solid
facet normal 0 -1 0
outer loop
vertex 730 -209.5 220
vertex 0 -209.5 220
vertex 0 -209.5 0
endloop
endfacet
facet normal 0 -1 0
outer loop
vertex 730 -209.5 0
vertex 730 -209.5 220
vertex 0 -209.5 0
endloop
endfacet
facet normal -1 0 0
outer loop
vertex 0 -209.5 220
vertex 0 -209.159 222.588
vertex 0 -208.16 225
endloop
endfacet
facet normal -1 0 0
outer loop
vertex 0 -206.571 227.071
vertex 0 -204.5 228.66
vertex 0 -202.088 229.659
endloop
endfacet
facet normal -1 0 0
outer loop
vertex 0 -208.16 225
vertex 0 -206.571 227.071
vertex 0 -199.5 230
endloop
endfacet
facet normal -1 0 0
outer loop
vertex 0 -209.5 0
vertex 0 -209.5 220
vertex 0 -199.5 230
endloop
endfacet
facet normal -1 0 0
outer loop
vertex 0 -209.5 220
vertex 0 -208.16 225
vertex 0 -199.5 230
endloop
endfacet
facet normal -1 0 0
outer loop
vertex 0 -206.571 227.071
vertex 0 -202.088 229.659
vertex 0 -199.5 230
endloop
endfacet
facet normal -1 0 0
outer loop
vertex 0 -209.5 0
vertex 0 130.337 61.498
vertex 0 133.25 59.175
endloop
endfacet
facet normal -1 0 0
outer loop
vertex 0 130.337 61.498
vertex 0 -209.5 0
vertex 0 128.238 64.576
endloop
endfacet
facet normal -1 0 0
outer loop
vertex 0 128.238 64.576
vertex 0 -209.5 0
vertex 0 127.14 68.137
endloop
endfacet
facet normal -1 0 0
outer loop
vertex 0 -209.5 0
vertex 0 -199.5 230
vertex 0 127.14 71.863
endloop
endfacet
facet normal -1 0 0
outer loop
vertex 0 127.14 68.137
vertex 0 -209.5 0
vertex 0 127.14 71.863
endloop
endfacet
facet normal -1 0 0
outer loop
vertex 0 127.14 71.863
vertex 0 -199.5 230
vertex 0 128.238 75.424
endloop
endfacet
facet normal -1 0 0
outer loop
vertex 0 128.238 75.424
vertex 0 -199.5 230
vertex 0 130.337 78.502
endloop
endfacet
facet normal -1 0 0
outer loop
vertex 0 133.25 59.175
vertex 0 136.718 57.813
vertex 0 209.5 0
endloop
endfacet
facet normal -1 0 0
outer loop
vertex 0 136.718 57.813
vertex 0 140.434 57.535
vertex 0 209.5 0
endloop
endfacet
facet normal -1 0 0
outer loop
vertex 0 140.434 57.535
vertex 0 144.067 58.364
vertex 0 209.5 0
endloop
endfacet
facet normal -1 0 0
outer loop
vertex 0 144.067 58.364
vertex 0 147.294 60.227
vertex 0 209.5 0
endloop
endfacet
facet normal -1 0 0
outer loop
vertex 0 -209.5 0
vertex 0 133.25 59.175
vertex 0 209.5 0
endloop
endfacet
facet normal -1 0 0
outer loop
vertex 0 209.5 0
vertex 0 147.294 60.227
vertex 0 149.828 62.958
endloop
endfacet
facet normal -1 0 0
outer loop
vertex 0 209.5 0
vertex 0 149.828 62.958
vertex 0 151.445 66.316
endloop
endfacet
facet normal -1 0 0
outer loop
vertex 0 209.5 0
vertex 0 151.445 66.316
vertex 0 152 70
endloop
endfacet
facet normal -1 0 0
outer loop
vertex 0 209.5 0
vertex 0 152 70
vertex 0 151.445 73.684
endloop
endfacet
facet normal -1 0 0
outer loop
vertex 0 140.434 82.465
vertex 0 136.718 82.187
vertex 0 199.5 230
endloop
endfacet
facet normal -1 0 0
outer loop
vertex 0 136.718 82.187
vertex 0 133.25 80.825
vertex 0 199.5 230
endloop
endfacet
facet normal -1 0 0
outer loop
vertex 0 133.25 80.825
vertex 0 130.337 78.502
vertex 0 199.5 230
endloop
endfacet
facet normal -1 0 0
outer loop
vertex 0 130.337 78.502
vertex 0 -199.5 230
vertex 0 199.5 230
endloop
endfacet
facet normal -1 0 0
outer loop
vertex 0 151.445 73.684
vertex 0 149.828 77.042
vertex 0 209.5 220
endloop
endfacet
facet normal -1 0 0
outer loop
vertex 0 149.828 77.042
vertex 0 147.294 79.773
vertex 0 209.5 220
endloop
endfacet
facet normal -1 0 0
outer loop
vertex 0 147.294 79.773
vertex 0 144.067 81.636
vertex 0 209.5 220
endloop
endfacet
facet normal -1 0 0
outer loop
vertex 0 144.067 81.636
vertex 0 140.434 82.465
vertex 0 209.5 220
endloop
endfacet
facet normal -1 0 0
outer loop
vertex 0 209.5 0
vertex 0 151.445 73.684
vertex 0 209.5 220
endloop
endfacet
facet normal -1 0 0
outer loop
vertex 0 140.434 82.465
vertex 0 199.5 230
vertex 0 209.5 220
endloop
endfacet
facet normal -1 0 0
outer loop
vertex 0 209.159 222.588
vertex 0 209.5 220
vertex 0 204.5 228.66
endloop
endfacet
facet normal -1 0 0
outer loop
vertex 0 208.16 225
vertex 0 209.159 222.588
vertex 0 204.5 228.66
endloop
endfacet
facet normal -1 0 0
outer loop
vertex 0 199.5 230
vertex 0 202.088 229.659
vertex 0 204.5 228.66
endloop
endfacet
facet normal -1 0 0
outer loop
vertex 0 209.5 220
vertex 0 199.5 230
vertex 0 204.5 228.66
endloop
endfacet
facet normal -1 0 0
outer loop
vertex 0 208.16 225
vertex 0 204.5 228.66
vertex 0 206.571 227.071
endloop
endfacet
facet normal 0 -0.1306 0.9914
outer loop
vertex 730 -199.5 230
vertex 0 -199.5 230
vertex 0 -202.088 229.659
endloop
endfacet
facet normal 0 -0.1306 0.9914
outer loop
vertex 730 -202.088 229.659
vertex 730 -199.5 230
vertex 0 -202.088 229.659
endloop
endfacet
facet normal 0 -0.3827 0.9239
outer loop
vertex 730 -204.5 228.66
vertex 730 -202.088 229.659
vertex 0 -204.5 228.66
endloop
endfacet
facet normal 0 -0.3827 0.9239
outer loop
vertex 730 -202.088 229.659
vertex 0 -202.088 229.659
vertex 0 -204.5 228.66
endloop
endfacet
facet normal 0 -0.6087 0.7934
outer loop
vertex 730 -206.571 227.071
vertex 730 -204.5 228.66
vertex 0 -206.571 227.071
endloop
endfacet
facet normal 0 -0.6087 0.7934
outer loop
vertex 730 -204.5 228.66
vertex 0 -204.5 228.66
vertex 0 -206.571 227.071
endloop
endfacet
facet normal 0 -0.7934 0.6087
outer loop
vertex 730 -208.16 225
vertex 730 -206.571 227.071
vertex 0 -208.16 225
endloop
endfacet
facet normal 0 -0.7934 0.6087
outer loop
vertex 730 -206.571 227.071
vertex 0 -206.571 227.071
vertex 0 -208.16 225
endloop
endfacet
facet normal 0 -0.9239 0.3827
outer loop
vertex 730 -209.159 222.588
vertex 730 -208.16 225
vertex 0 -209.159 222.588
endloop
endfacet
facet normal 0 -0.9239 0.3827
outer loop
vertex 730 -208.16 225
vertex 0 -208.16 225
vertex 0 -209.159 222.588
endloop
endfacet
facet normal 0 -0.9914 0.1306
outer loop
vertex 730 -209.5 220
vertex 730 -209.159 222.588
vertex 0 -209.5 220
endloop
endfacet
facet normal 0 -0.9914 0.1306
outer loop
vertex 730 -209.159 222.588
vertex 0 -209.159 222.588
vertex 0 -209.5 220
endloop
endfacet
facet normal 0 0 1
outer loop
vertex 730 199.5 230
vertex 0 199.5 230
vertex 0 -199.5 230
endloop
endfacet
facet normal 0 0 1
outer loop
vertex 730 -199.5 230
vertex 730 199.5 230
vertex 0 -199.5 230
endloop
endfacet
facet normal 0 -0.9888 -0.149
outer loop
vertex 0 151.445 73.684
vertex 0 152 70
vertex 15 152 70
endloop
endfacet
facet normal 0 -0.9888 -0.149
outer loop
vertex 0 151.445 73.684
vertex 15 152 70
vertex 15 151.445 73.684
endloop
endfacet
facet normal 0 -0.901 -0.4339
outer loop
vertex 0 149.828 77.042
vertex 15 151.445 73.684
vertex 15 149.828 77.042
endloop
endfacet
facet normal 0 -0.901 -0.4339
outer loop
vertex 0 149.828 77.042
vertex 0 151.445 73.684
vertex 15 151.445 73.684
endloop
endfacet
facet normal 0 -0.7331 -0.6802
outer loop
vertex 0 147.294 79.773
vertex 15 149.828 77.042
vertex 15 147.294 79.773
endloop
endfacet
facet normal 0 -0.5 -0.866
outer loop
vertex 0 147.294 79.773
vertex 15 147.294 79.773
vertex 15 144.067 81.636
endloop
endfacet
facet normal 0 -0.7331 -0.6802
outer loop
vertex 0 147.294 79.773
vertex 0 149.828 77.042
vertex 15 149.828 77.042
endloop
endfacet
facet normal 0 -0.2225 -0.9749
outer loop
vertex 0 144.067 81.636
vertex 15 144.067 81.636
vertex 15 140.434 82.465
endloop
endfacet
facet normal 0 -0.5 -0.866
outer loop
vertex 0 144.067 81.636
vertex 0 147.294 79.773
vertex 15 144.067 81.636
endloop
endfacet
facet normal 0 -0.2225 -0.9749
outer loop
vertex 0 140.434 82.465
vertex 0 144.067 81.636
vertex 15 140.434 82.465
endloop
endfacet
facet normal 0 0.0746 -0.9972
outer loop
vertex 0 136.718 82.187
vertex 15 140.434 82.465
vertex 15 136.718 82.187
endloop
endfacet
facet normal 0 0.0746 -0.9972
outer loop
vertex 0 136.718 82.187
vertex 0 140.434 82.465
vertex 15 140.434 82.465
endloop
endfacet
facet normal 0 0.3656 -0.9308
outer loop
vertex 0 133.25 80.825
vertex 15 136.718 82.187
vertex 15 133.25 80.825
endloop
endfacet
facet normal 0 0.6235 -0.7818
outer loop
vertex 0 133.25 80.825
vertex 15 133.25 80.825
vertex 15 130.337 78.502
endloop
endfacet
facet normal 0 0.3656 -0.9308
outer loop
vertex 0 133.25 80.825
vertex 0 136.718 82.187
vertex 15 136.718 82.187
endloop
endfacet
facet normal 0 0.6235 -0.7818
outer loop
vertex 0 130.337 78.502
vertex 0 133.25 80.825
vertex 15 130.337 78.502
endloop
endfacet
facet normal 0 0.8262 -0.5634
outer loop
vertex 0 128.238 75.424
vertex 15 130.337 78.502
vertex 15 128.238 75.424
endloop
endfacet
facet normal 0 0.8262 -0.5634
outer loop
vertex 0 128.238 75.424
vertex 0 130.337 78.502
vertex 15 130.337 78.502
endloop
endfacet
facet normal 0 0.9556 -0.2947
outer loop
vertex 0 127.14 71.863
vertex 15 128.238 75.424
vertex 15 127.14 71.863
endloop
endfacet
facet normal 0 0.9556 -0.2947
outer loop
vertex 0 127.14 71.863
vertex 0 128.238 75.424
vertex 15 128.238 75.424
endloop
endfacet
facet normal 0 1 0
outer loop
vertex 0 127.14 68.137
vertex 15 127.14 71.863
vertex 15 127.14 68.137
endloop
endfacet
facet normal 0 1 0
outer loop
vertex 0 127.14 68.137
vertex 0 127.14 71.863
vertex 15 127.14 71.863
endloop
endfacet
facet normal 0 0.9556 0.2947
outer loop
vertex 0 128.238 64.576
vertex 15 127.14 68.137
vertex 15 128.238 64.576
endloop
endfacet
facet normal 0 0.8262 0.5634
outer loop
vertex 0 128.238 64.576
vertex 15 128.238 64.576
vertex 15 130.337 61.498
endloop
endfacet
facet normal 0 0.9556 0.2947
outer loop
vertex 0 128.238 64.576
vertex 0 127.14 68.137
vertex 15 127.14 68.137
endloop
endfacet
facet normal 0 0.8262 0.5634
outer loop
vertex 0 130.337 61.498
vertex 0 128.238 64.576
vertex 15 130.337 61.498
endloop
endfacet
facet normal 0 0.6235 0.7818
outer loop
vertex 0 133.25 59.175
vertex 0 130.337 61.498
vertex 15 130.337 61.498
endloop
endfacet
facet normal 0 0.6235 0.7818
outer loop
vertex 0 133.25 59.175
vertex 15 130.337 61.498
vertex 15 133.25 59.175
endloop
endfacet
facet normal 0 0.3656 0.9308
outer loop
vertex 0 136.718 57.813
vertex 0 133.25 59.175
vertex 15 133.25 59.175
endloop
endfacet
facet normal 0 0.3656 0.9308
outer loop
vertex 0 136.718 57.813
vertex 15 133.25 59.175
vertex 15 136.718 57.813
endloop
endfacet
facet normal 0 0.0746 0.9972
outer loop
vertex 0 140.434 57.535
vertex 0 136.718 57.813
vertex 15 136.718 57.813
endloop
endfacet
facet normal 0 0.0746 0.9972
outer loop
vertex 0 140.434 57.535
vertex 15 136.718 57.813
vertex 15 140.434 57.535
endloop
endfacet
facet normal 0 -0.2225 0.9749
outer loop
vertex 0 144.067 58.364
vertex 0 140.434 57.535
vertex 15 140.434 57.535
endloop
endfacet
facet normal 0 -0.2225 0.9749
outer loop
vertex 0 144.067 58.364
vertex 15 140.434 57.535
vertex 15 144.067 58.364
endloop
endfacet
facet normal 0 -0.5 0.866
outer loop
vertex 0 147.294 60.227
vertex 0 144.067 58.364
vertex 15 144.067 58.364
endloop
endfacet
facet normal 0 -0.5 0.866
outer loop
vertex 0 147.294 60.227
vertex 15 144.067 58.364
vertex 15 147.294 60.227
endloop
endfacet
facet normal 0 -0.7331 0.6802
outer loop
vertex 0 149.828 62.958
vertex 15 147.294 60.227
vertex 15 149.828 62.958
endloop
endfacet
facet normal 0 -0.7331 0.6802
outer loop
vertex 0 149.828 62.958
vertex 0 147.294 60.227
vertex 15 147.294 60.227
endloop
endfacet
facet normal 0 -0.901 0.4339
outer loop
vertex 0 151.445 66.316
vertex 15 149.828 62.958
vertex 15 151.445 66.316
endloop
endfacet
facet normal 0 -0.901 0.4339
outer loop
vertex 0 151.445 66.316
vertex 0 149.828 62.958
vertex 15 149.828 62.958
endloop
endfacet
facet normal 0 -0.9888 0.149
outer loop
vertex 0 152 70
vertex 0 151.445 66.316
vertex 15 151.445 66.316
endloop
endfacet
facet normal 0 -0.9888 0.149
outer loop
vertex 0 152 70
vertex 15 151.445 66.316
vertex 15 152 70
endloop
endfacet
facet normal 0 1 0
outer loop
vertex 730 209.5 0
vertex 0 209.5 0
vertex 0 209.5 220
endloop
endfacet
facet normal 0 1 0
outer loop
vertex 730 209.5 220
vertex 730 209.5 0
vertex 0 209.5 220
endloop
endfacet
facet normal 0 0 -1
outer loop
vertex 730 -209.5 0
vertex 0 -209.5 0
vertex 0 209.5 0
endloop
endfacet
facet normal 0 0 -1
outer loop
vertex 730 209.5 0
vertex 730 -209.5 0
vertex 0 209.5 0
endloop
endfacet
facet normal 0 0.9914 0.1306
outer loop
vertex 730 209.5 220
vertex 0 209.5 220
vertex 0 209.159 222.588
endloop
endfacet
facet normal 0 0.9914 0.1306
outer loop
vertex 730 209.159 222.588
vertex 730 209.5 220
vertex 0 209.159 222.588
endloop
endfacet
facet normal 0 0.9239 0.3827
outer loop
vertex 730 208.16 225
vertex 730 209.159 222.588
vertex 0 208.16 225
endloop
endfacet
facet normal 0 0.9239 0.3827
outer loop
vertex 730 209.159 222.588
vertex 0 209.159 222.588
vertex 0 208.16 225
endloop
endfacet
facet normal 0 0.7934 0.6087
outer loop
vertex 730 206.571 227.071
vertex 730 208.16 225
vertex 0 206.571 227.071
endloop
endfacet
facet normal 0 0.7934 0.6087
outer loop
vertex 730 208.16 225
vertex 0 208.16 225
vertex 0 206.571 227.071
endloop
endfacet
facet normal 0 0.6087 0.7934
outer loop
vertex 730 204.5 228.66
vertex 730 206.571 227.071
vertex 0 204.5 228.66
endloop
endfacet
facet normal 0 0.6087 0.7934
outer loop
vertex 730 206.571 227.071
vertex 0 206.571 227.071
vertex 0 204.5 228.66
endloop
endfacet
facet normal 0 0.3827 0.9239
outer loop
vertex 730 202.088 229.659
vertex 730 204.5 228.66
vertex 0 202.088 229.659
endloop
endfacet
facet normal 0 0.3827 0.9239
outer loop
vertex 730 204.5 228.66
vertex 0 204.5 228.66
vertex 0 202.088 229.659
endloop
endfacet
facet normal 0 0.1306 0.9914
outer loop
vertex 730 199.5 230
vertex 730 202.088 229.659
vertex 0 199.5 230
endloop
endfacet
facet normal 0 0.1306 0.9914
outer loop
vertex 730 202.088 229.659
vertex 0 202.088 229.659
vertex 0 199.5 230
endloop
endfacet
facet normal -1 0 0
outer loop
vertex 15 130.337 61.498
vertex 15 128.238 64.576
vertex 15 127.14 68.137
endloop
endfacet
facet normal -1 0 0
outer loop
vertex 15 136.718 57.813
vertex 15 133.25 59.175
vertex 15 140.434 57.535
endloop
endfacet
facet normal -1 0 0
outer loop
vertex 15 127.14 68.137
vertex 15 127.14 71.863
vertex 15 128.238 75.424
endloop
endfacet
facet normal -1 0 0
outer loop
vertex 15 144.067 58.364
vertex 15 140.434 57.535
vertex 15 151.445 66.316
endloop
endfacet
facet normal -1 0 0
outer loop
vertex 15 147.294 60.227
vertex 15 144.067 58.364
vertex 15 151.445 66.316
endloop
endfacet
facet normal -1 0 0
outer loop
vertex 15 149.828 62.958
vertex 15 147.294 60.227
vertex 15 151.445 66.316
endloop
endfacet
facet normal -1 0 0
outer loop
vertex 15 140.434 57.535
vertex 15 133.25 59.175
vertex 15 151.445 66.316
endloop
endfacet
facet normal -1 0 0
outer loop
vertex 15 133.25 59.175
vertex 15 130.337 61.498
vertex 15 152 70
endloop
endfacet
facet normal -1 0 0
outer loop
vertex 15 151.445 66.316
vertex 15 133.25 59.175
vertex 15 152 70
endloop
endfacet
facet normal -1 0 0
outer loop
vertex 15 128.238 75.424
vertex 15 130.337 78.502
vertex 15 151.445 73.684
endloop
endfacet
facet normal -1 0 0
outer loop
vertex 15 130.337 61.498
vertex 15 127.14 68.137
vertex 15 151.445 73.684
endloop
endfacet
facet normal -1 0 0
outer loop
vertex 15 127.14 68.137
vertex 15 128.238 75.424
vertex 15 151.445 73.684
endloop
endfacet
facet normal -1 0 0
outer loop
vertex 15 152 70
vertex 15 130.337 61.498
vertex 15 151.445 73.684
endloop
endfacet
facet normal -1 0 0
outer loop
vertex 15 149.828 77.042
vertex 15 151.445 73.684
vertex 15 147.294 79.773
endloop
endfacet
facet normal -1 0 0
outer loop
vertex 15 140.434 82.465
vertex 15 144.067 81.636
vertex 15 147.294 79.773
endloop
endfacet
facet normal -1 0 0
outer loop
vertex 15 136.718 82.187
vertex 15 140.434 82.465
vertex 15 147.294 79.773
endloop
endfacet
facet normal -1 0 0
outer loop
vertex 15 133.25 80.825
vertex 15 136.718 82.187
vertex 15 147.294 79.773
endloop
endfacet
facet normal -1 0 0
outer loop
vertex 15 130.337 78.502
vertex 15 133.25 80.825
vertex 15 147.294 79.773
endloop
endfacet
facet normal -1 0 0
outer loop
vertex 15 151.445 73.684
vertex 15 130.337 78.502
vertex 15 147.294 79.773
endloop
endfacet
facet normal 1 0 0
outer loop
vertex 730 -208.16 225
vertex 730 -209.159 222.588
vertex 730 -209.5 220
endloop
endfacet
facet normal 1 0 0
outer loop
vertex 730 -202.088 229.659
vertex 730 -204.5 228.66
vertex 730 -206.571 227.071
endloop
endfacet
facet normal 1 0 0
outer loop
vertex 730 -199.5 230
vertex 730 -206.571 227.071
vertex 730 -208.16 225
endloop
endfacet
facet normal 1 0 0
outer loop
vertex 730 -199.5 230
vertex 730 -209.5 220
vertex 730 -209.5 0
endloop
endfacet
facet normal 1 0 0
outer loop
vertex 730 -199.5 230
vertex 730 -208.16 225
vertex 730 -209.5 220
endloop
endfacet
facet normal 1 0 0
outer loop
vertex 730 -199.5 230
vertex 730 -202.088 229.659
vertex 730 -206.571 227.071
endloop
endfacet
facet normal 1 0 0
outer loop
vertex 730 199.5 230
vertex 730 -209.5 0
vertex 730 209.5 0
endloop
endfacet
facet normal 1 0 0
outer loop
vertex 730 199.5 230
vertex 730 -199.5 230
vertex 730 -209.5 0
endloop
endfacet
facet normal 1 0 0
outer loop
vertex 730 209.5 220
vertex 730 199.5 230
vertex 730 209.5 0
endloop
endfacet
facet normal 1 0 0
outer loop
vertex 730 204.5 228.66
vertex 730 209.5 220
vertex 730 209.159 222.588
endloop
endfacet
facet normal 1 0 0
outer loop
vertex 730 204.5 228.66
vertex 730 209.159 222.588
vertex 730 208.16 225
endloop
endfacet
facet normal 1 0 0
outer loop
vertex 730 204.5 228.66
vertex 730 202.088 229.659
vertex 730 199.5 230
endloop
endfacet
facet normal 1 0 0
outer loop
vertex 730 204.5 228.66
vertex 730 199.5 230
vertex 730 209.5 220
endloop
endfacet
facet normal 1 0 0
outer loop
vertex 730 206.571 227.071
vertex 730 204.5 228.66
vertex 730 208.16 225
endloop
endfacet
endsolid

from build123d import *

# Parameters (mm, degrees)
PAD_DEPTH    = 730
SKETCH001_R  = 12.5
POCKET_DEPTH = 15


with BuildPart() as part:
    # Sketch → Pad (new body)
    with BuildSketch(Plane.YZ):
        with BuildLine():
            Line((-209.5, 0), (209.5, 0))
            Line((209.5, 0), (209.5, 220))
            ThreePointArc((209.5, 220), (206.571068, 227.071068), (199.5, 230))
            Line((199.5, 230), (-199.5, 230))
            ThreePointArc((-199.5, 230), (-206.571068, 227.071068), (-209.5, 220))
            Line((-209.5, 220), (-209.5, 0))
        make_face()
    extrude(amount=PAD_DEPTH)

    # Sketch001 → Pocket (cut)
    with BuildSketch(Plane.YZ):
        with Locations((139.5, 70)):
            Circle(SKETCH001_R)
    extrude(amount=POCKET_DEPTH, mode=Mode.SUBTRACT)


solid = part.part
